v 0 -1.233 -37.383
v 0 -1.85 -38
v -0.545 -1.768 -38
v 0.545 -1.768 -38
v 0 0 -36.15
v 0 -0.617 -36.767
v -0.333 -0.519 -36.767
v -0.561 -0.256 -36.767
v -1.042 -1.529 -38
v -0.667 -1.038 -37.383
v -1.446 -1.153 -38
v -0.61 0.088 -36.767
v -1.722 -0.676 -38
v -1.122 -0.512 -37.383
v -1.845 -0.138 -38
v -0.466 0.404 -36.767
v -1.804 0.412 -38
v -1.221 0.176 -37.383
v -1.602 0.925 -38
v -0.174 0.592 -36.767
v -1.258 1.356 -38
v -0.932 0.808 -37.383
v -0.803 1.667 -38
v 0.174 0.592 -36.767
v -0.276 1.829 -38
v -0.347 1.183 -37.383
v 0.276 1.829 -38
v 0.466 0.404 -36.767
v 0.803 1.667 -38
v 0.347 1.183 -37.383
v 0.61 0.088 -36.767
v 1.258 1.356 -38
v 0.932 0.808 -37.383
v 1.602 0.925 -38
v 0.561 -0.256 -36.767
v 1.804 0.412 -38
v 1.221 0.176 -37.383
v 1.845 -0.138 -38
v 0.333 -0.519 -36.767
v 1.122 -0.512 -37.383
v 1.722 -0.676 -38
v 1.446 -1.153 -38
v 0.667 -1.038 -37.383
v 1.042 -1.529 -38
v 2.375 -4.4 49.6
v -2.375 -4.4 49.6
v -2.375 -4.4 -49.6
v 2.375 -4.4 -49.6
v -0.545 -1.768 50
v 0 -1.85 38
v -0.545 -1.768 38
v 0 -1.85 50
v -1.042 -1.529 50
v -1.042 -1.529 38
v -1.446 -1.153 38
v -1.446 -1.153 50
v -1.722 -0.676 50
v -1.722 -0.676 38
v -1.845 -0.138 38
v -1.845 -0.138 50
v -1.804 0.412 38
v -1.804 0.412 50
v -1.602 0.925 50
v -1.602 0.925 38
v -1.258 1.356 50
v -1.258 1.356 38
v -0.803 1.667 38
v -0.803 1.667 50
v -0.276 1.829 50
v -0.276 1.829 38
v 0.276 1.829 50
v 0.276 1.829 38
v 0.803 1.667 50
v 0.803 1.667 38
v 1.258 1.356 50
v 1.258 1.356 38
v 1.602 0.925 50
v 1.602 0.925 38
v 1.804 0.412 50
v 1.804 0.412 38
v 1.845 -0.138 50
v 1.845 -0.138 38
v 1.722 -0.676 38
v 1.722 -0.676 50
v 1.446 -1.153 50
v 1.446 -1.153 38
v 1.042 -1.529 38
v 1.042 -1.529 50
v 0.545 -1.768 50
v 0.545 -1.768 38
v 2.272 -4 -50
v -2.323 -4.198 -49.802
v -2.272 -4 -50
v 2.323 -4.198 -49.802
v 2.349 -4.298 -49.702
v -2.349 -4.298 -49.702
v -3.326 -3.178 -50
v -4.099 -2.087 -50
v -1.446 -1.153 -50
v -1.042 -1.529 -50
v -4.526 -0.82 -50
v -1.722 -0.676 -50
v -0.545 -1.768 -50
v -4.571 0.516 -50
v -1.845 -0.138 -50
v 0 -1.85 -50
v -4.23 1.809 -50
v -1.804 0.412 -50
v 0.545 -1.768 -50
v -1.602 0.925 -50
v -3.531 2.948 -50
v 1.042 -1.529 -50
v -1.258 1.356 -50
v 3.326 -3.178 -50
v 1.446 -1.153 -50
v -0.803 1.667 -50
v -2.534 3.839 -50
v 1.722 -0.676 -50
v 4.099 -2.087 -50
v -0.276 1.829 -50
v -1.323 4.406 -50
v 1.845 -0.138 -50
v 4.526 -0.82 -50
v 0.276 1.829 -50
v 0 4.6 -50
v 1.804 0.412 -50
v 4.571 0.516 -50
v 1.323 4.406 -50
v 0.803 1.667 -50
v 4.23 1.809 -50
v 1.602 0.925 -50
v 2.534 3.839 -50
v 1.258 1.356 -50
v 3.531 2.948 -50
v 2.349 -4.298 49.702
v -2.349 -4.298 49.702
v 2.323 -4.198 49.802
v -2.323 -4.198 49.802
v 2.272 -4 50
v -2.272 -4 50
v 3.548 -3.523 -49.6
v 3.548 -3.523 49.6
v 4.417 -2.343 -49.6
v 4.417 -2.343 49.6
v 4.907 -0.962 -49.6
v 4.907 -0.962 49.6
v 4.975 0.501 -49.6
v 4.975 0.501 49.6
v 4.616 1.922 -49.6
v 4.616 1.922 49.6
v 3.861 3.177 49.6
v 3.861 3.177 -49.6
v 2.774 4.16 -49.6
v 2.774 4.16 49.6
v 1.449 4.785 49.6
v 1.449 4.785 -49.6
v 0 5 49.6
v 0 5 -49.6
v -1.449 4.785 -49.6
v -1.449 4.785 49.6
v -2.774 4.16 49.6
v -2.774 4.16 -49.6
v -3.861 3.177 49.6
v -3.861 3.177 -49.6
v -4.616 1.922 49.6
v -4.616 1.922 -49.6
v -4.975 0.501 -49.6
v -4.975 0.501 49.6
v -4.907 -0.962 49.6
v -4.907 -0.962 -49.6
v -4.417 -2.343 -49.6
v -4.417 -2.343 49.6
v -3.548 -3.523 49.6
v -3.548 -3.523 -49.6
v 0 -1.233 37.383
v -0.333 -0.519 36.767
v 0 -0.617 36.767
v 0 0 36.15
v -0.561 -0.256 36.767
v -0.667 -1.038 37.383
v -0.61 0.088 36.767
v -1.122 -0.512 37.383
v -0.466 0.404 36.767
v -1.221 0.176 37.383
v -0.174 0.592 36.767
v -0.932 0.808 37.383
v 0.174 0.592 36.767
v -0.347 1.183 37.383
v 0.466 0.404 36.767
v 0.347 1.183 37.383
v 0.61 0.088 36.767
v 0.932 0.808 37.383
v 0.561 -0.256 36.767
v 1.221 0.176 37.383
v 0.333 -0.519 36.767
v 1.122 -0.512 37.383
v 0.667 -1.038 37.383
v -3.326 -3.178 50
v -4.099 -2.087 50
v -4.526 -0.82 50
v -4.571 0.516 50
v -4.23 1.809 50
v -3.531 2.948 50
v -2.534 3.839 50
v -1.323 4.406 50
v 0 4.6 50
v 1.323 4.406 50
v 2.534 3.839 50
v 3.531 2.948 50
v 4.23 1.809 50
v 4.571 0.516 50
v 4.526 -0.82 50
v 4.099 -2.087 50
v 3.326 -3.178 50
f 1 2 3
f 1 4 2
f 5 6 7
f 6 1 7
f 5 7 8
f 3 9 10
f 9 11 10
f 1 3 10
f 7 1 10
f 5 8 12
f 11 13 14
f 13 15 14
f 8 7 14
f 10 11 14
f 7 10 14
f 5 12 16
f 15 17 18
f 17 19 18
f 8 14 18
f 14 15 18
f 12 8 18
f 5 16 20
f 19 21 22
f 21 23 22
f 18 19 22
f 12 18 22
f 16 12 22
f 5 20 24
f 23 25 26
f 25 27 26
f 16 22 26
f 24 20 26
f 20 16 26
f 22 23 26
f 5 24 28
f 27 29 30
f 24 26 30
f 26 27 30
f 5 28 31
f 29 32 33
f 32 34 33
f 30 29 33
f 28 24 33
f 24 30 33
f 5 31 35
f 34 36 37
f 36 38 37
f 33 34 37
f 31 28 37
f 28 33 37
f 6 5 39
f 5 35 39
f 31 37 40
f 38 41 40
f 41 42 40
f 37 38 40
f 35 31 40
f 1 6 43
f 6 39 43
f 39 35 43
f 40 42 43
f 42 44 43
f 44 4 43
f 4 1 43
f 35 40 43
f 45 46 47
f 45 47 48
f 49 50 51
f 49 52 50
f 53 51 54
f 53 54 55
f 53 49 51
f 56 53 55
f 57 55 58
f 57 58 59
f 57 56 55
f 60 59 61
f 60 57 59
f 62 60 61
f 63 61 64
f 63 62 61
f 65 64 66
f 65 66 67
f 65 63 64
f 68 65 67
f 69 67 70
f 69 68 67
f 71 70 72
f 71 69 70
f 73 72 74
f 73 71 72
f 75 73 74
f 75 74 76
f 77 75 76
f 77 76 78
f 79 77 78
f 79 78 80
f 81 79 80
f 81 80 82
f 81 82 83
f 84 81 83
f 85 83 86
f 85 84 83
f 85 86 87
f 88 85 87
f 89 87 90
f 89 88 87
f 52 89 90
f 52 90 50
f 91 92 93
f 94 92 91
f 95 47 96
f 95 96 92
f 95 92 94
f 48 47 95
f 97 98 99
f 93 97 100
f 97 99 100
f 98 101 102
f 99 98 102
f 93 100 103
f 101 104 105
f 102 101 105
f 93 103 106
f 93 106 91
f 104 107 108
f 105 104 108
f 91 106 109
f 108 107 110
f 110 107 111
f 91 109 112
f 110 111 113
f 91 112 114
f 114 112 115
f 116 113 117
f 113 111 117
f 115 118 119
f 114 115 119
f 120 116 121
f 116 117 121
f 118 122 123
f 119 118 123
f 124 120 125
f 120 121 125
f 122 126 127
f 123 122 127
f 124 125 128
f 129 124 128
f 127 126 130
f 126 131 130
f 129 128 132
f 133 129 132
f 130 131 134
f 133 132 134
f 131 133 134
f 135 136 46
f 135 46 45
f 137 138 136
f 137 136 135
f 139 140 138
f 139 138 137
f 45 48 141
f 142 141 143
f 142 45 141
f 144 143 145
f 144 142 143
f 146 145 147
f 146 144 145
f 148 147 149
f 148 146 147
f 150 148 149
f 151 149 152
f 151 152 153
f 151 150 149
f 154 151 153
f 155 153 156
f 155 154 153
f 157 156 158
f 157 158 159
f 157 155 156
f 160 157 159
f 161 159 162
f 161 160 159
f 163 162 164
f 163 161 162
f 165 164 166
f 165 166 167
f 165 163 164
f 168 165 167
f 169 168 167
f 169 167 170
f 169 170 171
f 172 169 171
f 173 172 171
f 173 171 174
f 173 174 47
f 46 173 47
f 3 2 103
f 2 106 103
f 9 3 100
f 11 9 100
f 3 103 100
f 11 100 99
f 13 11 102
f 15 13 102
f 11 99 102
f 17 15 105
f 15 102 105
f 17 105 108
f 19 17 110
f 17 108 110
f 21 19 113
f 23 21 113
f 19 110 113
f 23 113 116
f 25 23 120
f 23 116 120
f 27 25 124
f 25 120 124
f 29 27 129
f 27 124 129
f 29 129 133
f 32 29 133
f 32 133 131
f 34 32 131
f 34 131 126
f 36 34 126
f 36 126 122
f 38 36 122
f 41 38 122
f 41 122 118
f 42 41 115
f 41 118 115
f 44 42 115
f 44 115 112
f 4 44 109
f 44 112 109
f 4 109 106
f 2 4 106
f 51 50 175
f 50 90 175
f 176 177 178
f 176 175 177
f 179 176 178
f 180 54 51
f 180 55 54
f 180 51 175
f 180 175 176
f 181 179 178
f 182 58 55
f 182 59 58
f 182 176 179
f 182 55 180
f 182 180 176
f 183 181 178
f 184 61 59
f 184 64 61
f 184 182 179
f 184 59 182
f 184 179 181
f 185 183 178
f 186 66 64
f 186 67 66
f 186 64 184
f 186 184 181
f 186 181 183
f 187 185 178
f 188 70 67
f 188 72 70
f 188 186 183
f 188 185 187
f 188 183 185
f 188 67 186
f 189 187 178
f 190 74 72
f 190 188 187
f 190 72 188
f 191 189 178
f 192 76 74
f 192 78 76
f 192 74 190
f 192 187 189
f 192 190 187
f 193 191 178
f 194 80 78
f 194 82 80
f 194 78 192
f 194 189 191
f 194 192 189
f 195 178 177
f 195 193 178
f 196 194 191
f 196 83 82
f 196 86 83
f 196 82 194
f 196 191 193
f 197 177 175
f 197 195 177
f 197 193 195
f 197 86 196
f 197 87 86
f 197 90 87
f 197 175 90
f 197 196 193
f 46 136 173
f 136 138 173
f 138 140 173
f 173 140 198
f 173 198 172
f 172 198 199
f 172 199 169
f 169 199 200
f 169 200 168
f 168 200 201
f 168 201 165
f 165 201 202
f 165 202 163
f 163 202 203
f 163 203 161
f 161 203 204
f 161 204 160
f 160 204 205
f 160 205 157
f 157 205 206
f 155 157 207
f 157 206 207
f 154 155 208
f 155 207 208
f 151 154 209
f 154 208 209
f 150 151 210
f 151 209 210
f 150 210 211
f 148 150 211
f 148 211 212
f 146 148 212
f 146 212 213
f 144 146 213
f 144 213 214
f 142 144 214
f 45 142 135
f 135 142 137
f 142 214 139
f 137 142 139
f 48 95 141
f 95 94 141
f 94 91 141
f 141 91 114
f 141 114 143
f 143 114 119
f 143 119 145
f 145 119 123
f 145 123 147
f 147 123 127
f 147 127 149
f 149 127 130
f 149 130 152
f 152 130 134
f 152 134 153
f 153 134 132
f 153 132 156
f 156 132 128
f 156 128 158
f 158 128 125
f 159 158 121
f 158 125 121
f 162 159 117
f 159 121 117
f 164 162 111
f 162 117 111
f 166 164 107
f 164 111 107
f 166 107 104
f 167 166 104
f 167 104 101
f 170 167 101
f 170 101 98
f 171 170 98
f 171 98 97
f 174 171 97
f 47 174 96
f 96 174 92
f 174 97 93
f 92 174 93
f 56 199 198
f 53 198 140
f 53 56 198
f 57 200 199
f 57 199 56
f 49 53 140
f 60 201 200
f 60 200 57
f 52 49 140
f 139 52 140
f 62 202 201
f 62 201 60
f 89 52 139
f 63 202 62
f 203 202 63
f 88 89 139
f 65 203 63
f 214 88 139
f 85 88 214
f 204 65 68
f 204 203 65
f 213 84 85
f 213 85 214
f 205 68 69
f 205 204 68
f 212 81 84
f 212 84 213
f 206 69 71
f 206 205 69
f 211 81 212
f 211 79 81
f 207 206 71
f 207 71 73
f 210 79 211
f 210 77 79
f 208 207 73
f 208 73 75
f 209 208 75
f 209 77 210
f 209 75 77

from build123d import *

# Parameters (mm, degrees)
SKETCH1_R           = 5
BOSS_EXTRUDE1_DEPTH = 50
CUT_EXTRUDE1_DEPTH  = 101
CHAMFER1_SIZE       = 0.4


with BuildPart() as part:
    # Sketch1 → Boss-Extrude1 (new body, symmetric)
    with BuildSketch(Plane.XY):
        Circle(SKETCH1_R)
    extrude(amount=BOSS_EXTRUDE1_DEPTH, both=True)

    # Sketch3 → Hole1 (revolve, cut)
    with BuildSketch(Plane(origin=(0, 0, 50), x_dir=(0, -1, 0), z_dir=(1, 0, 0))):
        Polygon((0, 0), (0, 13.85), (1.85, 12), (1.85, 0), align=None)
    hole1 = revolve(axis=Axis((0, 0, 54.244199587), (0, 0, -1)), mode=Mode.SUBTRACT)

    # Mirror7: Hole1 across plane
    add(hole1.mirror(Plane.XY), mode=Mode.SUBTRACT)

    # Sketch4 → Cut-Extrude1 (cut, through all)
    with BuildSketch(Plane.XY.offset(50)):
        with BuildLine():
            Line((-2.374868417, -4.4), (2.374868417, -4.4))
            ThreePointArc((2.374868417, -4.4), (0, -5), (-2.374868417, -4.4))
        make_face()
    extrude(amount=-CUT_EXTRUDE1_DEPTH, mode=Mode.SUBTRACT)

    # Chamfer1
    chamfer1_edges = [part.edges().sort_by_distance(p)[0] for p in [
        (0, 5, -50),
        (0, 5, 50),
        (0, -4.4, -50),
        (0, -4.4, 50),
    ]]
    chamfer(chamfer1_edges, length=CHAMFER1_SIZE)


solid = part.part
